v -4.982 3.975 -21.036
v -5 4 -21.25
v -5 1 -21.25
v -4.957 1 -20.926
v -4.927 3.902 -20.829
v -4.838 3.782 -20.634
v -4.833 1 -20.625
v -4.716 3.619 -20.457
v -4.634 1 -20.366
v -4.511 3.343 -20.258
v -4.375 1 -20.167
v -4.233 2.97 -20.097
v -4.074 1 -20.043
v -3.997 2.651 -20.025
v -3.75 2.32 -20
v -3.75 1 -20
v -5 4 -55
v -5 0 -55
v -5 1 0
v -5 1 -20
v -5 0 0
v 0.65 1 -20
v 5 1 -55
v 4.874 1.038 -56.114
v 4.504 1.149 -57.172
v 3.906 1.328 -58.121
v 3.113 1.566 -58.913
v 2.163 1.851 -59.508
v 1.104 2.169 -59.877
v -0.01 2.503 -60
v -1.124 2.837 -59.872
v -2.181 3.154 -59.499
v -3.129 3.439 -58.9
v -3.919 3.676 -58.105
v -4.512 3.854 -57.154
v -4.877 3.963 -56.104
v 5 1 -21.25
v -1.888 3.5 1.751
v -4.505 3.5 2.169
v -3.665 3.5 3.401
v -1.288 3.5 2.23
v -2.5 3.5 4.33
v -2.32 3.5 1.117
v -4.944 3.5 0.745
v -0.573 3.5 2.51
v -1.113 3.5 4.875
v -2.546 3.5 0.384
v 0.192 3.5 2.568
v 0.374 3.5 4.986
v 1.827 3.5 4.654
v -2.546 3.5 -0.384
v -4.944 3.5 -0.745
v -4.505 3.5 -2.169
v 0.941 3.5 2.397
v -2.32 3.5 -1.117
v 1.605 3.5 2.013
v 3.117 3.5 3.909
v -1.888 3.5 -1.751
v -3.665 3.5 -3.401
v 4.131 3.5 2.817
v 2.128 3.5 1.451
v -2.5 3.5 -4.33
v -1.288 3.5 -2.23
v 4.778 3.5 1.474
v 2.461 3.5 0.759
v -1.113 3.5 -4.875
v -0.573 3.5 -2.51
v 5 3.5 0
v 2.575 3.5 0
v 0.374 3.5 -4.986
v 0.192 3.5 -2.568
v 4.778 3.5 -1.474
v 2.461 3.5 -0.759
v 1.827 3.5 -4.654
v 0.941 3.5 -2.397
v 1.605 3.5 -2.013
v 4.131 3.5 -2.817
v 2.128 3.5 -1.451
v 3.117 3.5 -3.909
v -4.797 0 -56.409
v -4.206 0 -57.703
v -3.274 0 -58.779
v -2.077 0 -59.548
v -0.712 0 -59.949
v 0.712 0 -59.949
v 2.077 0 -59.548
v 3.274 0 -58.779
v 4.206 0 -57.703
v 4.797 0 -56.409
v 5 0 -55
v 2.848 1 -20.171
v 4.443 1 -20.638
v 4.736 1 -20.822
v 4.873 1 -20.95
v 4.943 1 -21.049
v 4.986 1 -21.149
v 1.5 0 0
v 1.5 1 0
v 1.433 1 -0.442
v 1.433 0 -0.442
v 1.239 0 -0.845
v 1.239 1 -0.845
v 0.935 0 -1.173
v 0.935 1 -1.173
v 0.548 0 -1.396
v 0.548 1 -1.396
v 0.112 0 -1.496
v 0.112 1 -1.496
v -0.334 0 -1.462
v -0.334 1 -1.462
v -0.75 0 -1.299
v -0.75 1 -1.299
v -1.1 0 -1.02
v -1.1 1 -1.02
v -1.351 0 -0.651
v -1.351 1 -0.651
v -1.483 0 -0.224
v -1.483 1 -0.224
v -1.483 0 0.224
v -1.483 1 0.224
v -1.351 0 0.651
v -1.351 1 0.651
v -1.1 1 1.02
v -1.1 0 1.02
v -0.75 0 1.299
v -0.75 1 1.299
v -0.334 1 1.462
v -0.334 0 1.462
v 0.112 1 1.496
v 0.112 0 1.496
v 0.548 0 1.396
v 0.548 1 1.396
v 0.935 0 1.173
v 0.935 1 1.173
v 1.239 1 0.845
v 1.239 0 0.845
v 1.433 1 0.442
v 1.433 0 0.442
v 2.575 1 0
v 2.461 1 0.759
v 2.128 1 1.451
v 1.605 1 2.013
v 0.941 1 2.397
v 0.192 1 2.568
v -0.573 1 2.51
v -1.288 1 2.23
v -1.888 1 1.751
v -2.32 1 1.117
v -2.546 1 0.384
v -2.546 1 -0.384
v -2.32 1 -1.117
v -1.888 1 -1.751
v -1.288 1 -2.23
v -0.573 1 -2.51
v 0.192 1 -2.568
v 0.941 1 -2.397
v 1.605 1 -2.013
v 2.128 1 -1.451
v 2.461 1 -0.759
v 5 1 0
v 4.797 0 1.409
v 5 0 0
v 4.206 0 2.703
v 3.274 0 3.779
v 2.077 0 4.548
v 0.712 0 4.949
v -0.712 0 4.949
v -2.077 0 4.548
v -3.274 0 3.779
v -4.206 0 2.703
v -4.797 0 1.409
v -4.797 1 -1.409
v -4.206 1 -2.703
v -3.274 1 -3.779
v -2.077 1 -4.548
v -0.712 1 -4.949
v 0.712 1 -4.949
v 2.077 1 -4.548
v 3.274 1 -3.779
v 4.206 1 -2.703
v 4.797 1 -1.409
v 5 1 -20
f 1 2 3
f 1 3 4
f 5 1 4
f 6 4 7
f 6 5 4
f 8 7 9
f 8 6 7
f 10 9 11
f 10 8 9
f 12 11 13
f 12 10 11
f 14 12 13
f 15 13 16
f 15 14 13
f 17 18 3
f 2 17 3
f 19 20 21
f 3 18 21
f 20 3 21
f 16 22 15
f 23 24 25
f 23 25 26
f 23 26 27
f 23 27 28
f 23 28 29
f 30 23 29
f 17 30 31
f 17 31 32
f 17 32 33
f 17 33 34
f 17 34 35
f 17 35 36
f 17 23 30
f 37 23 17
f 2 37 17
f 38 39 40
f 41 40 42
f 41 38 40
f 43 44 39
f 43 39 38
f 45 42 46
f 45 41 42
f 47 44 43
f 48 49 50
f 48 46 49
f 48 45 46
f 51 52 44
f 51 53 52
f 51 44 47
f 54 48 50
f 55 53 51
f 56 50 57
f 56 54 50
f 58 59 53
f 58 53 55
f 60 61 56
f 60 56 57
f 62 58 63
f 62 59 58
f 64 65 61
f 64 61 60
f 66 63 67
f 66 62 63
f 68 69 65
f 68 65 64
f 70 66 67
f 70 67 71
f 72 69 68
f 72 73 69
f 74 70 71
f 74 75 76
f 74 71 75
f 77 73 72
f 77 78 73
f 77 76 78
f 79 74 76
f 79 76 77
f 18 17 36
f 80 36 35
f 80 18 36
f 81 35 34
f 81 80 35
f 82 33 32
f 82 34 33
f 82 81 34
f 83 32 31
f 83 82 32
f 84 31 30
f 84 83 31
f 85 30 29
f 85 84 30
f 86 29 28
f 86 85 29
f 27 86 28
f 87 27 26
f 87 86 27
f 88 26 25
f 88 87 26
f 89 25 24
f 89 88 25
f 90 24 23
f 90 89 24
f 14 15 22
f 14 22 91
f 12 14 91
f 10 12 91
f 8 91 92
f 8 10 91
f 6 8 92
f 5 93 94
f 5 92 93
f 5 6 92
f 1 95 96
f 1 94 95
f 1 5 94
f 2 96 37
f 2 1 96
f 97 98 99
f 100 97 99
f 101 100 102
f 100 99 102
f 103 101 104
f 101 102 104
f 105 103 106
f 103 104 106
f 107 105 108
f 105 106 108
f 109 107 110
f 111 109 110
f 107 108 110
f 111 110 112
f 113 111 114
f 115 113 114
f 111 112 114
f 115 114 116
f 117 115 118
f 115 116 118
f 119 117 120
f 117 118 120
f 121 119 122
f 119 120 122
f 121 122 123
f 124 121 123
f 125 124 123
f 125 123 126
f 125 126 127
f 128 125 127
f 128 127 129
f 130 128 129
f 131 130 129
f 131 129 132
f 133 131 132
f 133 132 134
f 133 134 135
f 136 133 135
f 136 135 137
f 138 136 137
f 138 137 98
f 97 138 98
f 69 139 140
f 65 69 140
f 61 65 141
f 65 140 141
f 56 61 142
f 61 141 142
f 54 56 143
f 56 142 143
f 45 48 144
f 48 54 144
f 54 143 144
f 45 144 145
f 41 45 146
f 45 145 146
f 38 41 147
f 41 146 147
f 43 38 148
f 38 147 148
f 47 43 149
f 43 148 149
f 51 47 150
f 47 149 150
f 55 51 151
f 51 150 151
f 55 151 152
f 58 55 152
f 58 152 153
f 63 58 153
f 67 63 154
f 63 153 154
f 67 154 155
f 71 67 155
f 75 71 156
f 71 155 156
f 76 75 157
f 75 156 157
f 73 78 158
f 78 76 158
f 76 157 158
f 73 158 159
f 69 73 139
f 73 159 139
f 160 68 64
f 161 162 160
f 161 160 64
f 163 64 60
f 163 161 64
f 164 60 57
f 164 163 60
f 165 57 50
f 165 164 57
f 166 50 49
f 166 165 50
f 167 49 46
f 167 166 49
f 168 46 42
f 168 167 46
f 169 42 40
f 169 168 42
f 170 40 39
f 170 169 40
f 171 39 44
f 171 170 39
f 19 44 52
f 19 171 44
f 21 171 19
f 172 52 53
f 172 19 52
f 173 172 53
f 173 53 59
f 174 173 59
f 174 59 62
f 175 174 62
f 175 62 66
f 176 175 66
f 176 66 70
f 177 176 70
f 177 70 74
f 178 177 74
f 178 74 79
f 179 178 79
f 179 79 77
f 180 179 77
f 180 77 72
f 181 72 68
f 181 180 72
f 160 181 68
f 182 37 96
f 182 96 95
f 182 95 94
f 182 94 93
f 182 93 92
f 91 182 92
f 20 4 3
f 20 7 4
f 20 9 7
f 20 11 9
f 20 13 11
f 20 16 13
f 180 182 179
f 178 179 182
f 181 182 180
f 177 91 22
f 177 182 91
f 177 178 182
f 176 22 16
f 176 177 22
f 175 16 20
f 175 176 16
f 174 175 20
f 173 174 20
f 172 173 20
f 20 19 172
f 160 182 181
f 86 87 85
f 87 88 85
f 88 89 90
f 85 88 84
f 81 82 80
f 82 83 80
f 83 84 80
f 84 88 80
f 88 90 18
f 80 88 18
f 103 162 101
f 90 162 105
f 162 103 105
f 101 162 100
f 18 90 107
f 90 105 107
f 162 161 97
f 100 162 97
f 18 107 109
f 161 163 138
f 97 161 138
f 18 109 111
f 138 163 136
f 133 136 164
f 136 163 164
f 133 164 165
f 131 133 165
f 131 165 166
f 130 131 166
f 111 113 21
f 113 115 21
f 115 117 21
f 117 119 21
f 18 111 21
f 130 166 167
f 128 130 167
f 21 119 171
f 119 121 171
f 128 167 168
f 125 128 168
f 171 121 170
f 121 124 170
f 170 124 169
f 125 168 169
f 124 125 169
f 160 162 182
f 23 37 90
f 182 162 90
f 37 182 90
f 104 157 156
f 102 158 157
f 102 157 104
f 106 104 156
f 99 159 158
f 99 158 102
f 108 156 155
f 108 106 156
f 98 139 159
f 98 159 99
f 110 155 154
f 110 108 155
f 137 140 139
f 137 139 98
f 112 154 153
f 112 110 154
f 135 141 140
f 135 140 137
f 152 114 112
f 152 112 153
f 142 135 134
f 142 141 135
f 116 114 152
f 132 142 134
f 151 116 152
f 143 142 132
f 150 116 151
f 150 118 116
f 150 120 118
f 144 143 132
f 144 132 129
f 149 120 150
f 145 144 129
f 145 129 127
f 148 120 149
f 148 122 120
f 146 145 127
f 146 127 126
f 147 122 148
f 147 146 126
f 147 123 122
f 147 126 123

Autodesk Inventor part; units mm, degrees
ref_plane "YZ Plane" through (0, 0, 0) normal (1, 0, 0) x (0, 1, 0)
ref_plane "XZ Plane" through (0, 0, 0) normal (0, 1, 0) x (-1, 0, 0)
ref_plane "XY Plane" through (0, 0, 0) normal (0, 0, 1) x (1, 0, 0)
sketch "Skizze1" plane through (0, 0, 0) normal (0, 1, 0) x (-1, 0, 0)
  circle A0 centre (0, 0) radius 2.6
  circle A1 centre (0, 0) radius 5
  line L0 (5, 0) -> (-5, 0)
  line L1 (-5, 0) -> (-5, -60)
  line L2 (-5, -60) -> (5, -60)
  line L3 (5, -60) -> (5, 0)
  circle A2 centre (0, -55) radius 5
  point P0 (-5, -55)
  point P1 (5, -55)
  dimension "d1" = 10
  dimension "d0" = 5.2
  dimension "d2" = 60
extrude "Extrusion1" add sketch "Skizze1" along normal blind 1 contours L0 A0 | L0 A1 A0 | A0 L0 A1 | A0 L0 | L3 A2 L1 A1 | A2
sketch "Skizze2" plane through (0, 1, 0) normal (0, 1, 0) x (1, 0, 0)
  circle A0 centre (0, 0) radius 2.575
  line L0 (-5, 55) -> (-5, 0) projected
  circle A1 centre (0, 0) radius 5
  dimension "d5" = 5.15
extrude "Extrusion2" add sketch "Skizze2" along normal blind 2.5
sketch "Skizze3" plane through (0, 1, 0) normal (0, 1, 0) x (1, 0, 0)
  circle A0 centre (0, 0) radius 1.5
  dimension "d8" = 3
extrude "Extrusion3" cut sketch "Skizze3" against normal blind 2.5
sketch "Skizze5" plane through (0, 1, 0) normal (0, 1, 0) x (1, 0, 0)
  arc A0 (5, 55) -> (-5, 55) centre (0, 55) ccw projected
  line L0 (5, 20) -> (-5, 20)
  line L1 (-5, 20) -> (-5, 55)
  line L2 (-5, 55) -> (5, 55)
  line L3 (5, 55) -> (5, 20)
  arc A1 (5, 55) -> (-5, 55) centre (0, 55) ccw
  point P0 (0, 0)
extrude "Extrusion4" add sketch "Skizze5" along normal blind 3
sketch "Skizze6" plane through (-5, 1, -20) normal (0, 0, 1) x (1, 0, 0)
  line L0 (0, 0) -> (0, 3) projected
  line L1 (0, 3) -> (0, 0)
  line L2 (10, 0) -> (0, 0) projected
  line L3 (0, 0) -> (10, 0)
  line L4 (0, 3) -> (10, 3) projected
  line L5 (10, 0) -> (0, 3)
  line L6 (0, -1) -> (0, 3) projected
  line L7 (0, 3) -> (10, 3)
  line L8 (10, -1) -> (10, 3) projected
  line L9 (10, 3) -> (10, 0)
  point P0 (5, -1)
extrude "Extrusion5" cut sketch "Skizze6" against normal blind 47 contours L4 L8 L5
fillet "Rundung1" radius 1.25 2 edges at (0, 2.5, -20) (-5, 2.5, -20)
equation "\"Biegeradius\" = Stärke"
equation "\"BreiteBiegungsfreistellung\" = Stärke"
equation "\"TiefeBiegungsfreistellung\" = 0.5 * Stärke"
equation "\"GrößeEckenfreistellung\" = 4 * Stärke"
equation "\"MinimalRest\" = 2 * Stärke"
equation "\"Übergangsradius\" = Biegeradius"
equation "\"JacobiRadiusGröße\" = Biegeradius"
equation "\"Abstandsgröße\" = Stärke"
equation "\"Stärke\" = 0.5"
properties part number "Pbj5"
